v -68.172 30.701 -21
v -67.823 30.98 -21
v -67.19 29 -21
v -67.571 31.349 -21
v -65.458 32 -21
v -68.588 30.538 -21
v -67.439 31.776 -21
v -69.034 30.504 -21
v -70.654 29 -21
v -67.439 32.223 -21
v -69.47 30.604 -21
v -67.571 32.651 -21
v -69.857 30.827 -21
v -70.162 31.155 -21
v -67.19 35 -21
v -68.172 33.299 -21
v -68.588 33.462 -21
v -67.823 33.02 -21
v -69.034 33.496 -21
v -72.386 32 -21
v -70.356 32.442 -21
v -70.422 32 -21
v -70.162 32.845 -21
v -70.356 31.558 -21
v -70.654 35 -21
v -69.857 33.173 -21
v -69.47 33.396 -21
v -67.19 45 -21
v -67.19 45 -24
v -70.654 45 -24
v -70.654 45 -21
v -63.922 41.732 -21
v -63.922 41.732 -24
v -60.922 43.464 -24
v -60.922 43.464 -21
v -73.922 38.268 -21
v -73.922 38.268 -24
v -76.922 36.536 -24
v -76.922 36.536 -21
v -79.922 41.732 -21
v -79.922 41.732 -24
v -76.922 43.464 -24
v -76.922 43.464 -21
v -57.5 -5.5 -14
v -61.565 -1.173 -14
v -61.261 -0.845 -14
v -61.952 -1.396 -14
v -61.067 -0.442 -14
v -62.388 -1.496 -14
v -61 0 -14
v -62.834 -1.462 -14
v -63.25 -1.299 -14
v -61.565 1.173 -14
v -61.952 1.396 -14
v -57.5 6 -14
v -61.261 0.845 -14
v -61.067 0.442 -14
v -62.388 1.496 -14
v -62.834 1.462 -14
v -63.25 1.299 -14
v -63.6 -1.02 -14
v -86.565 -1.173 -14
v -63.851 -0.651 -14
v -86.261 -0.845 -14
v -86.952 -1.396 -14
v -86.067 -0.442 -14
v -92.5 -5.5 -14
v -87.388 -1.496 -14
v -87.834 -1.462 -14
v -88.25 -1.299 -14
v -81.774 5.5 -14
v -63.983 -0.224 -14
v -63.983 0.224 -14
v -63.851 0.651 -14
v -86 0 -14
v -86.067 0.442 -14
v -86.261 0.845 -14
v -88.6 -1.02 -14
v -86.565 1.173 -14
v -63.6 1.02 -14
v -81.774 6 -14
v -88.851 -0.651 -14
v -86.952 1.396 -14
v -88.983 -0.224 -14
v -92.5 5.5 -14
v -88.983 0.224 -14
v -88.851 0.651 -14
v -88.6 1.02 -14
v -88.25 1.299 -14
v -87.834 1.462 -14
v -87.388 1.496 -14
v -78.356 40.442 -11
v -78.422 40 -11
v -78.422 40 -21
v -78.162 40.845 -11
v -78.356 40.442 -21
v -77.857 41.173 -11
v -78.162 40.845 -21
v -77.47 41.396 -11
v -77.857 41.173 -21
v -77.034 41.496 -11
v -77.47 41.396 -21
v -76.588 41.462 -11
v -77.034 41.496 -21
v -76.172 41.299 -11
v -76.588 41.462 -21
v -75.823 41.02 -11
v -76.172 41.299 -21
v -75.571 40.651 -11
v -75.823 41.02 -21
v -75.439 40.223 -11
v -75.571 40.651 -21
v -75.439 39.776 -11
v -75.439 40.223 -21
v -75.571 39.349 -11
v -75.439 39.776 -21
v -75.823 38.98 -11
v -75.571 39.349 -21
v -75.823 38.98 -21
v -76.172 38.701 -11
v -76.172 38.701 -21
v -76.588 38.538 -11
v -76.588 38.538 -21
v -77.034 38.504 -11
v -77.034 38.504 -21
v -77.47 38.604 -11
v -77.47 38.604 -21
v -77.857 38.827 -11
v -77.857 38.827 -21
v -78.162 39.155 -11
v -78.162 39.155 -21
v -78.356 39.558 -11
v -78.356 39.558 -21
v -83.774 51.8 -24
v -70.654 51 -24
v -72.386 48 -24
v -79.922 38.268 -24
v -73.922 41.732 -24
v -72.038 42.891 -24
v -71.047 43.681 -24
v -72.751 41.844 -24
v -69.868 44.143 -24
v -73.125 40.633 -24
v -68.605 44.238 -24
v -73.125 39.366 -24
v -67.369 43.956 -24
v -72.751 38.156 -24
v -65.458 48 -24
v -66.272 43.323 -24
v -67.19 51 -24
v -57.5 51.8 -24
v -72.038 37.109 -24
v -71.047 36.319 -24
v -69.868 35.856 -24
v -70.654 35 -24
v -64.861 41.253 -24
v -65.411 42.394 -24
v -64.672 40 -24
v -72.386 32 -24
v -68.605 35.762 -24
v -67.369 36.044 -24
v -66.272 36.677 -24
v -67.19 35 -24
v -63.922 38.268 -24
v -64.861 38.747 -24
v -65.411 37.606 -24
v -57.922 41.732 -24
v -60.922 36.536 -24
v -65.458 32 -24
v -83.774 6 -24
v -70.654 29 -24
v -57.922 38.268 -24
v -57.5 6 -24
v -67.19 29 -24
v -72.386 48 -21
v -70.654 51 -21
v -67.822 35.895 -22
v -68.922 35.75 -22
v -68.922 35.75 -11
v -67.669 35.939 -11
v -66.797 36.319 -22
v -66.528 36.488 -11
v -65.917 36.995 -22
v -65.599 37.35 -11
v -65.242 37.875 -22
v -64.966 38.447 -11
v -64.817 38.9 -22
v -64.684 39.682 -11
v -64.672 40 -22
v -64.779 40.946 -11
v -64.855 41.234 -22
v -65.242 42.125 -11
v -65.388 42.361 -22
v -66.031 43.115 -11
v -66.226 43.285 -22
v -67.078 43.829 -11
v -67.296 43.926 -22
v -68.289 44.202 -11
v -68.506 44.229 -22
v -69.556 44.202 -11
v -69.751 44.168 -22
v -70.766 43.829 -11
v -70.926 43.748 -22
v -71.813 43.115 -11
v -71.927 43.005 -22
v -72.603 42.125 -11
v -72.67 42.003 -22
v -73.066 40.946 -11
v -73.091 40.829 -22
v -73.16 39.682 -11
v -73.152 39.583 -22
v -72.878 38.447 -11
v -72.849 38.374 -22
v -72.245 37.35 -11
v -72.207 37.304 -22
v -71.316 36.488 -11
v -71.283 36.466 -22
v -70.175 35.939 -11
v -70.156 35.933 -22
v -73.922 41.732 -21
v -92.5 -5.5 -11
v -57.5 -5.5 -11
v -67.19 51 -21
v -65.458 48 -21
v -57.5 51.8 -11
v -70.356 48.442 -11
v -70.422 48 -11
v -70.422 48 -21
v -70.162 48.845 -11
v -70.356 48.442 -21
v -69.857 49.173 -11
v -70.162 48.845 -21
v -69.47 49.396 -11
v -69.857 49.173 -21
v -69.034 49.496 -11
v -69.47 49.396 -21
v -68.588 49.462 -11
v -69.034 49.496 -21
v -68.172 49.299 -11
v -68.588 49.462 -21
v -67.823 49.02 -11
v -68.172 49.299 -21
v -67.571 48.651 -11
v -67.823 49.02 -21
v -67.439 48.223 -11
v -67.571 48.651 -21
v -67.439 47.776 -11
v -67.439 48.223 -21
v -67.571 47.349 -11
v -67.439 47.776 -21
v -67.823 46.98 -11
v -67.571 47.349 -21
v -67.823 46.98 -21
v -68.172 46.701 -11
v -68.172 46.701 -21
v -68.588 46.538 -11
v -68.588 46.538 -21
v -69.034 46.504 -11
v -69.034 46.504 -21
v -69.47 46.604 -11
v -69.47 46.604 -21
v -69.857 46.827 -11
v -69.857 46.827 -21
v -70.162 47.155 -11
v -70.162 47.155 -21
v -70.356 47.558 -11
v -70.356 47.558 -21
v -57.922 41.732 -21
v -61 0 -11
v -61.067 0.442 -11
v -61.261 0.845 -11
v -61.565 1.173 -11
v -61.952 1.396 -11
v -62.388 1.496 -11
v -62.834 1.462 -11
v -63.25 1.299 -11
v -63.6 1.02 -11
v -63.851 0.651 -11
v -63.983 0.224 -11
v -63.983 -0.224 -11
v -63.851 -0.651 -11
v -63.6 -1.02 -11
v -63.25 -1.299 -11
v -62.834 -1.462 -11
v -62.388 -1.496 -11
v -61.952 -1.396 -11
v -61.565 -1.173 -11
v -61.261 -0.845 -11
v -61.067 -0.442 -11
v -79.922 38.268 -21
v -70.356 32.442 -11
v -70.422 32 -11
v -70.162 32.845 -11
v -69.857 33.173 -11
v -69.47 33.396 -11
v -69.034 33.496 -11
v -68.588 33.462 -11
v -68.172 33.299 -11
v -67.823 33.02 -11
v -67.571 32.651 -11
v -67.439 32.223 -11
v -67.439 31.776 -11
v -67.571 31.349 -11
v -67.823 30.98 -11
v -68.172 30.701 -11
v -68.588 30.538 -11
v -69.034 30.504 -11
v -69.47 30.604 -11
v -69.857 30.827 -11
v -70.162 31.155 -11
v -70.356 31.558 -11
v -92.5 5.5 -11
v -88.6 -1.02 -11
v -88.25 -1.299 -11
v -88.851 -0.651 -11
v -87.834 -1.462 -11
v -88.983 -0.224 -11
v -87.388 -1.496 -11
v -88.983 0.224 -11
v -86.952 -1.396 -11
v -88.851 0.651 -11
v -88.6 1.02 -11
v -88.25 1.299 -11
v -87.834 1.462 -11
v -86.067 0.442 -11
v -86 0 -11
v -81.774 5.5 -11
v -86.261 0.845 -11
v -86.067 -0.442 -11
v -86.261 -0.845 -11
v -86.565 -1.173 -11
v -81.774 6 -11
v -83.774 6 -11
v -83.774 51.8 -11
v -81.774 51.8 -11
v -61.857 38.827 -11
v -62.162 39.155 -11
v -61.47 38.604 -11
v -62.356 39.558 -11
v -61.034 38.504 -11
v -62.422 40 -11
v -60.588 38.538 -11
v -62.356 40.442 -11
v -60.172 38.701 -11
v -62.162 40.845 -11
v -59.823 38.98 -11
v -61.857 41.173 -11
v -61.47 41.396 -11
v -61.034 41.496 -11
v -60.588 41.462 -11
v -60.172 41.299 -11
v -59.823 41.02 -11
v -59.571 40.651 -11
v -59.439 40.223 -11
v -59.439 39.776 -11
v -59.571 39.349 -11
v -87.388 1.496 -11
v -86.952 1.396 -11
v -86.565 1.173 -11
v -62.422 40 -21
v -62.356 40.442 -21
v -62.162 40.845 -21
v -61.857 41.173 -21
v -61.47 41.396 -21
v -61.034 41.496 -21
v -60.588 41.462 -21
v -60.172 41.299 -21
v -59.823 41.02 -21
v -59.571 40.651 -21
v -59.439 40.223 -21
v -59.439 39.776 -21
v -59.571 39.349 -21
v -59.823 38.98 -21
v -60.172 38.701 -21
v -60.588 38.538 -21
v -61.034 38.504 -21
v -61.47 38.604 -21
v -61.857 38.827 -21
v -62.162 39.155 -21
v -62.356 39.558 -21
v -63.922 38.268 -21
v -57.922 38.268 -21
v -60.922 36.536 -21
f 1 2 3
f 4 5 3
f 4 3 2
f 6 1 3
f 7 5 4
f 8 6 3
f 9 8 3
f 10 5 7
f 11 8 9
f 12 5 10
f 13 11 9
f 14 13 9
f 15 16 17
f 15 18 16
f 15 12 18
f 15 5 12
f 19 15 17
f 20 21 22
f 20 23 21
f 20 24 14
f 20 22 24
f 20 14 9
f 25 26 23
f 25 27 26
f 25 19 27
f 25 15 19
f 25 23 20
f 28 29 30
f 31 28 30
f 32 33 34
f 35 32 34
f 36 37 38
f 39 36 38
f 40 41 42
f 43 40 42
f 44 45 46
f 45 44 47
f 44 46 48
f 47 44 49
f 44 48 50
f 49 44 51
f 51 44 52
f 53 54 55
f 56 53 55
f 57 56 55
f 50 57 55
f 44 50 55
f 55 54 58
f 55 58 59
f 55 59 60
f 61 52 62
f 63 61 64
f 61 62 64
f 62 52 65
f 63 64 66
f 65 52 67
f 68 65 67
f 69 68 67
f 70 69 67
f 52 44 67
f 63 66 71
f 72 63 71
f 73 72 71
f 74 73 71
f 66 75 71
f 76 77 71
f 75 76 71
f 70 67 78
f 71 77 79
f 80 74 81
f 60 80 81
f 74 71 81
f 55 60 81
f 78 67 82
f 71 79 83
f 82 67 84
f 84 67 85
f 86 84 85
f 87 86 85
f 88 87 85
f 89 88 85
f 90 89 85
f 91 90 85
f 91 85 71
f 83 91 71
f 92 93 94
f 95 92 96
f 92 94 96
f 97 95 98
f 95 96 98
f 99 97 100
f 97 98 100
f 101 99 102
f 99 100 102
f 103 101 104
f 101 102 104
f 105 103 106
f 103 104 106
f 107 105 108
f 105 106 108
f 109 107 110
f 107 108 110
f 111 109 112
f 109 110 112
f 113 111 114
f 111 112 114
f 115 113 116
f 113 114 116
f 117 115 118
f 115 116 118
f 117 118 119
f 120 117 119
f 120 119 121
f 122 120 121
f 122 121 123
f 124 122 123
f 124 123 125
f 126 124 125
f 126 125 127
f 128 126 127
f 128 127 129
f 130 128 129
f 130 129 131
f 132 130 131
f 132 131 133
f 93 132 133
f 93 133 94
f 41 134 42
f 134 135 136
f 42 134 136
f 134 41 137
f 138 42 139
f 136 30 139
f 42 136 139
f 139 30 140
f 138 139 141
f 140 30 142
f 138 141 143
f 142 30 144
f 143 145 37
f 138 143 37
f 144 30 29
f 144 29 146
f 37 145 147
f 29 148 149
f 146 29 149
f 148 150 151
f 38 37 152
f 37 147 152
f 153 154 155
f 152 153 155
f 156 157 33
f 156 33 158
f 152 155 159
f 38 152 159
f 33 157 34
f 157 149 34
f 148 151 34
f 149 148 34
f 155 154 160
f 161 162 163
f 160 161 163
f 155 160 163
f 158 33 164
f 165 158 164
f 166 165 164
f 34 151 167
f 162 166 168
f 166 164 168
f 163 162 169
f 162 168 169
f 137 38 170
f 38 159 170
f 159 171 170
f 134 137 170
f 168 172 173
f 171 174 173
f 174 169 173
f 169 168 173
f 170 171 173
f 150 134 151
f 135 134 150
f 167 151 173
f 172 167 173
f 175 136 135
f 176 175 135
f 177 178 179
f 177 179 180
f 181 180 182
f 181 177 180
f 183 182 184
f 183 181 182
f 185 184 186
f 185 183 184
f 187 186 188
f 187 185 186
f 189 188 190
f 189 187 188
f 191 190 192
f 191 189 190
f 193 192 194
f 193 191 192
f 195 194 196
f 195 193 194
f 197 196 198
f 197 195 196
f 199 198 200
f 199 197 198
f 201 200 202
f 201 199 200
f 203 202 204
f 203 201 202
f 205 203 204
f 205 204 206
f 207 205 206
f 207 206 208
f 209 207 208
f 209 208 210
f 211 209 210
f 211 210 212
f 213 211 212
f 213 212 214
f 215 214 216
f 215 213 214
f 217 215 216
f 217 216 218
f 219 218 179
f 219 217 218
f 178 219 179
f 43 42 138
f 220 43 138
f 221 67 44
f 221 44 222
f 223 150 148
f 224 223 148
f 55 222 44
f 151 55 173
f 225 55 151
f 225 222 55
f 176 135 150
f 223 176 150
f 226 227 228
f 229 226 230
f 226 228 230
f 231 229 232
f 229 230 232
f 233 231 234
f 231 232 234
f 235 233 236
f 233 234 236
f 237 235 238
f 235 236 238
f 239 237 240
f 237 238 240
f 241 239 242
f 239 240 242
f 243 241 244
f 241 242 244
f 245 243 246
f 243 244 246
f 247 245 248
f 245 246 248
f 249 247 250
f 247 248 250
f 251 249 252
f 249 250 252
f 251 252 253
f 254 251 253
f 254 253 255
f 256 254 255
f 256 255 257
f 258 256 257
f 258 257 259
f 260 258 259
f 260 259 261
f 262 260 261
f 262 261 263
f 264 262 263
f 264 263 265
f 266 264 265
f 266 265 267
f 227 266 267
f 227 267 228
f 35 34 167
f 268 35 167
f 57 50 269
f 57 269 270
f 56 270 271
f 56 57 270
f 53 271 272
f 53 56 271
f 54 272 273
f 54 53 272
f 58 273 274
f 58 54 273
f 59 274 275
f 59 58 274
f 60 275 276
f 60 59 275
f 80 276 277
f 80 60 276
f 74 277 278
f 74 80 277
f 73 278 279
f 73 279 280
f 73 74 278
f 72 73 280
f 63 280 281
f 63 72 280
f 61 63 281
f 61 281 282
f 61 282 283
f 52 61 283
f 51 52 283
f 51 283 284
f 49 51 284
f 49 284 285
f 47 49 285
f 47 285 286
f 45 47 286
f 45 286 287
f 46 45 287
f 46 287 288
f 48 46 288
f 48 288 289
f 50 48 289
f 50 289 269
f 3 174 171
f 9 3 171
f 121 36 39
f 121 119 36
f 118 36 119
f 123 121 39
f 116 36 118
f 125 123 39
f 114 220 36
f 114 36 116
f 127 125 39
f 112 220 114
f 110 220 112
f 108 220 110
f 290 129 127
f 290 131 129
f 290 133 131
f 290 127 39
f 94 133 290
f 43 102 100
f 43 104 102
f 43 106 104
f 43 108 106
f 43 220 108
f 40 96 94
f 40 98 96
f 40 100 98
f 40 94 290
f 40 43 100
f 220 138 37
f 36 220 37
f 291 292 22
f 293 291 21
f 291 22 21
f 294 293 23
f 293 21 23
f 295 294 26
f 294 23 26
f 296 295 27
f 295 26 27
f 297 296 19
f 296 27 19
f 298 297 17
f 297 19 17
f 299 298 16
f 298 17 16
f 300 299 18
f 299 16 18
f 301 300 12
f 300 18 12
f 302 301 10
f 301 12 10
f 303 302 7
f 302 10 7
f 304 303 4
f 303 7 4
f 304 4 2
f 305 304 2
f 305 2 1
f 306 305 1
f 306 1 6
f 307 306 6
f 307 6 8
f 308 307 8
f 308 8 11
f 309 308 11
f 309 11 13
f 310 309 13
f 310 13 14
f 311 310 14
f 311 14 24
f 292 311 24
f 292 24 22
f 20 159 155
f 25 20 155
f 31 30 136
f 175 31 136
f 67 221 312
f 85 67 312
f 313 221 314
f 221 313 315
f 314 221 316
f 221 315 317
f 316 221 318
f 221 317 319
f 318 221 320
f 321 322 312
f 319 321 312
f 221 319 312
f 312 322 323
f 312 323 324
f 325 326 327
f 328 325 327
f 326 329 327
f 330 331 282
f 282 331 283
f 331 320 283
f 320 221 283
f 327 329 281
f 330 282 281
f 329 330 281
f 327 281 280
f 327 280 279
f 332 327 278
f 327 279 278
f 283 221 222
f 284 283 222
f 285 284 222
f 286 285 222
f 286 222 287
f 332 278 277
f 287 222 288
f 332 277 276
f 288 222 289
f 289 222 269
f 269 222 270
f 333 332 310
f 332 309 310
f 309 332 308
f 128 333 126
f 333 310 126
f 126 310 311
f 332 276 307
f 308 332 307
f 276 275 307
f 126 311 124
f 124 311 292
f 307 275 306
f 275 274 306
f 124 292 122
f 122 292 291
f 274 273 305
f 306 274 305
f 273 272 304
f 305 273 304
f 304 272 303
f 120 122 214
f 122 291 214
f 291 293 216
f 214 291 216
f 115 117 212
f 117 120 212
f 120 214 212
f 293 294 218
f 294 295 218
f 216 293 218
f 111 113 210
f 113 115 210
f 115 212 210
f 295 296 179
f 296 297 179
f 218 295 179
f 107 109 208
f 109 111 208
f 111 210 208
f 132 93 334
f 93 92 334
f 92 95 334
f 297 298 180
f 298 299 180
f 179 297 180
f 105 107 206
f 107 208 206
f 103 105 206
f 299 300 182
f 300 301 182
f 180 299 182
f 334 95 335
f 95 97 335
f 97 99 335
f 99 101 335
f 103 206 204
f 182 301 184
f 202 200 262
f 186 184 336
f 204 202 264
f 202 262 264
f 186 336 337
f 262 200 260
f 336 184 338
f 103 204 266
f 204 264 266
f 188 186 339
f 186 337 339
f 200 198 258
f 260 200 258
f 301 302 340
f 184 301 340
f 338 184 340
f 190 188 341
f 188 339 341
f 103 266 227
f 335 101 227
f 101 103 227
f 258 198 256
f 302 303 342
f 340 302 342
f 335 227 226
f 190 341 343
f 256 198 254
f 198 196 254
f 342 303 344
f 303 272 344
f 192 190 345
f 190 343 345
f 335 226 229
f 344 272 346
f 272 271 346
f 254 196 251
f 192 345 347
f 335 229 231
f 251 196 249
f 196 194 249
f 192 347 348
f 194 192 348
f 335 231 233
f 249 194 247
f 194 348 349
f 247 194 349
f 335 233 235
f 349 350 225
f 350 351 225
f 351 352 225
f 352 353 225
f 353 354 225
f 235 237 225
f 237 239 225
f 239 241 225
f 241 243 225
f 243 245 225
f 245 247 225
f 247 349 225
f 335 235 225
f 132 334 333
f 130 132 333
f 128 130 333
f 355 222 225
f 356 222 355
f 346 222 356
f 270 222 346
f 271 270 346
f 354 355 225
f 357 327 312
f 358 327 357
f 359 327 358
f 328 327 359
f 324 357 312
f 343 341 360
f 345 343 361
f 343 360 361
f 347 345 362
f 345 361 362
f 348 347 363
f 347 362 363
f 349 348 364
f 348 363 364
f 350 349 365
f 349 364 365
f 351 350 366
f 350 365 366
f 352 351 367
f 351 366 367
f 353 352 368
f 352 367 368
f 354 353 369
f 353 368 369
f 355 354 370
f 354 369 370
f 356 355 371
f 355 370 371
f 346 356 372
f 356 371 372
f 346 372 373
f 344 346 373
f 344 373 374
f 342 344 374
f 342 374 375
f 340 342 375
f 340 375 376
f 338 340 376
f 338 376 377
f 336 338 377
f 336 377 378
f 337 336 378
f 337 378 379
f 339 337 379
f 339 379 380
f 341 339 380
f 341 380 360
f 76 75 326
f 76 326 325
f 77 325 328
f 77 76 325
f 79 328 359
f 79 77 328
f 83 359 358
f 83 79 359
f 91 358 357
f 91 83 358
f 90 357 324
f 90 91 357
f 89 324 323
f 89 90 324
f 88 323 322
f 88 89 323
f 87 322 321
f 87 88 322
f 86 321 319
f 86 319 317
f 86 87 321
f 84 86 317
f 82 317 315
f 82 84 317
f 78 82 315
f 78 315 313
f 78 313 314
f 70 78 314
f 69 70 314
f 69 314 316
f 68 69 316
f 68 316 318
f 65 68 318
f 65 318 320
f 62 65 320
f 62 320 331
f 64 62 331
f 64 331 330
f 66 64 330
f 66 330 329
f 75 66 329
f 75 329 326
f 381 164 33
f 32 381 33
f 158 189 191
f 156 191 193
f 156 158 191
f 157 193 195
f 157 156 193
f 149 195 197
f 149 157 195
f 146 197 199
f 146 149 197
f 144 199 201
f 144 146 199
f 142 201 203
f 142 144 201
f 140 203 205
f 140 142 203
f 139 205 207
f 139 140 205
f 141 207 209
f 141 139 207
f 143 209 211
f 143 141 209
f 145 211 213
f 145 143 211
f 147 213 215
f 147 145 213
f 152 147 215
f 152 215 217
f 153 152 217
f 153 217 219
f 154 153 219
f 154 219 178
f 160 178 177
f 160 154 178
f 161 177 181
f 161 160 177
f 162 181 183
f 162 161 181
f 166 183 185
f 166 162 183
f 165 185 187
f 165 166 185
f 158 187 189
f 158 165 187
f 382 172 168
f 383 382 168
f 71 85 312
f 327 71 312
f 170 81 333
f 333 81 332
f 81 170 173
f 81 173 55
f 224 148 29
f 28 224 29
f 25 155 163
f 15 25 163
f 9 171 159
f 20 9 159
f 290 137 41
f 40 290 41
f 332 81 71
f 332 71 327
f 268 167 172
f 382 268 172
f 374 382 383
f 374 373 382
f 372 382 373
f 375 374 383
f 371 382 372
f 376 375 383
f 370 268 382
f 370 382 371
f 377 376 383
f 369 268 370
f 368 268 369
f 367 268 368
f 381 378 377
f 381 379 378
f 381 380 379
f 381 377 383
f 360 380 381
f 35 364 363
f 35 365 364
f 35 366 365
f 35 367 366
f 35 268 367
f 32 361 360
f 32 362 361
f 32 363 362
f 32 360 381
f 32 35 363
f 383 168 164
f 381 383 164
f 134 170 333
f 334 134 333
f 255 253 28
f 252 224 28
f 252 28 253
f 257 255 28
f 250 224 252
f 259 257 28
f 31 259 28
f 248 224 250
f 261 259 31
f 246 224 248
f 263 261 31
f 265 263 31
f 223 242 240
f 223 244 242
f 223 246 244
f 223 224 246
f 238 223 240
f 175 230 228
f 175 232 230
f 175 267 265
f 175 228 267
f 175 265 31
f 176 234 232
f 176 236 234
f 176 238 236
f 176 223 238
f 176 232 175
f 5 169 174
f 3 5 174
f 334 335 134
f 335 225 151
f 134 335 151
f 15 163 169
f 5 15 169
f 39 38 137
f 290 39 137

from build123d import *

# Parameters (mm, degrees)
SKETCH1_W                   = 24.274152735811775
SKETCH1_H                   = 45.79992080637105
SKETCH1_R                   = 4.250000000000006
BOSS_EXTRUDE1_DEPTH         = 2
SKETCH1_3_W                 = 24.274152735811775
SKETCH1_3_H                 = 2
SKETCH1_3_H_2               = 43.79992080637105
BOSS_EXTRUDE2_DEPTH         = 8
BOSS_EXTRUDE3_START         = -8
SKETCH1_4_W                 = 24.274152735811775
SKETCH1_4_H                 = 43.79992080637105
SKETCH1_4_H_2               = 2
SKETCH1_4_R                 = 1.500000000000004
SKETCH1_4_R_2               = 1.4999999999999971
BOSS_EXTRUDE3_DEPTH         = 3
BODY_MOVE_COPY1_START       = -81.774152736
BODY_MOVE_COPY1_OUTLINE_W   = 13.599999999999994
BODY_MOVE_COPY1_OUTLINE_H   = 22
BODY_MOVE_COPY1_DEPTH       = 24.274152736
BODY_MOVE_COPY1_2_OUTLINE_W = 13.599999999999994
BODY_MOVE_COPY1_2_OUTLINE_H = 22
BODY_MOVE_COPY1_2_DEPTH     = 8.925981831
BODY_MOVE_COPY1_START_2     = -64.996207244
BODY_MOVE_COPY1_3_OUTLINE_W = 13.599999999999994
BODY_MOVE_COPY1_3_OUTLINE_H = 22
BODY_MOVE_COPY1_3_DEPTH     = 7.496207244
BODY_MOVE_COPY1_START_3     = -92.5
BODY_MOVE_COPY1_4_OUTLINE_W = 11
BODY_MOVE_COPY1_4_OUTLINE_H = 6.000000000000002
BODY_MOVE_COPY1_4_DEPTH     = 10.725847264
BODY_MOVE_COPY1_START_4     = -11
BODY_MOVE_COPY1_5_DEPTH     = 13
BODY_MOVE_COPY1_START_5     = -22
BODY_MOVE_COPY1_6_OUTLINE_R = 1.5
BODY_MOVE_COPY1_6_DEPTH     = 11
BODY_MOVE_COPY1_START_6     = -24
BODY_MOVE_COPY1_7_OUTLINE_R = 4.25
BODY_MOVE_COPY1_7_DEPTH     = 2
SKETCH2_R                   = 2.4999999999999956
SKETCH2_R_2                 = 1.7499999999999991
BOSS_EXTRUDE4_DEPTH         = 2
SKETCH2_R_3                 = 2.499999999999995
SKETCH2_R_4                 = 1.7500000000000013
BOSS_EXTRUDE4_2_DEPTH       = 2
BOSS_EXTRUDE5_START         = 2
SKETCH2_3_R                 = 2.499999999999995
SKETCH2_3_R_2               = 2.4999999999999956
BOSS_EXTRUDE5_DEPTH         = 10
BOSS_EXTRUDE8_START         = 2
BOSS_EXTRUDE8_OUTLINE_R     = 2.5
BOSS_EXTRUDE8_OUTLINE_R_2   = 1.75
BOSS_EXTRUDE8_DEPTH         = 10
BOSS_EXTRUDE8_2_OUTLINE_R   = 2.5
BOSS_EXTRUDE8_2_OUTLINE_R_2 = 1.5
BOSS_EXTRUDE8_2_DEPTH       = 12
BOSS_EXTRUDE9_START         = -22
SKETCH1_5_R                 = 4.250000000000006
BOSS_EXTRUDE9_DEPTH         = 11
SKETCH3_R                   = 4.250000000000006
SKETCH3_R_2                 = 1.4999999999999973
SKETCH3_R_3                 = 1.4999999999999822
CUT_EXTRUDE1_DEPTH          = 3
SKETCH3_2_R                 = 1.4999999999999822
SKETCH3_2_R_2               = 1.4999999999999973
CUT_EXTRUDE2_DEPTH          = 112.56199728722034
CUT_EXTRUDE3_DEPTH          = 69.81517846049216
BOSS_EXTRUDE10_DEPTH        = 2


with BuildPart() as part:
    # Sketch1 → Boss-Extrude1 (new body)
    with BuildSketch(Plane.XY):
        with Locations((-69.63707636790589, 28.899960403185524)):
            Rectangle(SKETCH1_W, SKETCH1_H)
        with Locations((-68.92218907483289, 39.99992080637105)):
            Circle(SKETCH1_R, mode=Mode.SUBTRACT)
    extrude(amount=BOSS_EXTRUDE1_DEPTH)

    # Sketch1<3> → Boss-Extrude2 (add)
    # profile 1 of 2: a face of its own
    with BuildSketch(Plane.XY):
        with Locations((-69.63707636790589, 7)):
            Rectangle(SKETCH1_3_W, SKETCH1_3_H)
    # profile 2 of 2: a face of its own
    with BuildSketch(Plane.XY):
        with Locations((-69.63707636790589, 29.899960403185524)):
            Rectangle(SKETCH1_3_W, SKETCH1_3_H_2)
        Polygon((-61.07022541385397, 39.99992080637103), (-64.99620724434341, 33.19992080637105), (-72.84817090532232, 33.19992080637105), (-76.77415273581178, 39.999920806371065), (-72.84817090532235, 46.79992080637104), (-64.99620724434344, 46.79992080637104), align=None, mode=Mode.SUBTRACT)
    extrude(amount=-BOSS_EXTRUDE2_DEPTH)

    # Sketch1<4> → Boss-Extrude3 (add)
    # profile 1 of 7: a face of its own
    with BuildSketch(Plane.XY.offset(BOSS_EXTRUDE3_START)):
        with Locations((-69.63707636790589, 29.899960403185524)):
            Rectangle(SKETCH1_4_W, SKETCH1_4_H)
        Polygon((-61.07022541385397, 39.99992080637103), (-64.99620724434341, 33.19992080637105), (-72.84817090532232, 33.19992080637105), (-76.77415273581178, 39.999920806371065), (-72.84817090532235, 46.79992080637104), (-64.99620724434344, 46.79992080637104), align=None, mode=Mode.SUBTRACT)
    # profile 2 of 7: a face of its own
    with BuildSketch(Plane.XY.offset(BOSS_EXTRUDE3_START)):
        Polygon((-67.5, -5.500000000000001), (-67.5, 5.5), (-57.5, 5.5), (-57.49999999999999, -5.5), align=None)
        Polygon((-59.03589838486225, -2.082e-14), (-60.76794919243112, 2.999999999999975), (-64.23205080756887, 2.999999999999975), (-65.96410161513775, -2.776e-14), (-64.23205080756888, -3.0000000000000098), (-60.767949192431125, -3.0000000000000098), align=None, mode=Mode.SUBTRACT)
    # profile 3 of 7: a face of its own
    with BuildSketch(Plane.XY.offset(BOSS_EXTRUDE3_START)):
        Polygon((-67.5, 5.5), (-57.5, 5.5), (-57.5, 6), (-81.77415273581178, 6), (-81.77415273581178, 5.5), align=None)
    # profile 4 of 7: a face of its own
    with BuildSketch(Plane.XY.offset(BOSS_EXTRUDE3_START)):
        with Locations((-69.63707636790589, 7)):
            Rectangle(SKETCH1_4_W, SKETCH1_4_H_2)
    # profile 5 of 7: a face of its own
    with BuildSketch(Plane.XY.offset(BOSS_EXTRUDE3_START)):
        Polygon((-81.77415273581178, -5.500000000000003), (-67.5, -5.500000000000001), (-67.5, 5.499999999999999), (-81.77415273581178, 5.499999999999997), align=None)
    # profile 6 of 7: a face of its own
    with BuildSketch(Plane.XY.offset(BOSS_EXTRUDE3_START)):
        Polygon((-60.767949192431125, -3.0000000000000098), (-59.03589838486225, -2.082e-14), (-60.76794919243112, 2.999999999999975), (-64.23205080756887, 2.999999999999975), (-65.96410161513775, -2.776e-14), (-64.23205080756888, -3.0000000000000098), align=None)
        with Locations(Location((-62.5, 0, 0), (0, 0, 270))):
            Circle(SKETCH1_4_R, mode=Mode.SUBTRACT)
    # profile 7 of 7: a face of its own
    with BuildSketch(Plane.XY.offset(BOSS_EXTRUDE3_START)):
        Polygon((-92.5, -5.500000000000004), (-92.5, 5.499999999999996), (-81.77415273581178, 5.499999999999997), (-81.77415273581178, -5.500000000000003), align=None)
        with Locations(Location((-87.5, -2.42e-15, 0), (0, 0, 270))):
            Circle(SKETCH1_4_R_2, mode=Mode.SUBTRACT)
    extrude(amount=-BOSS_EXTRUDE3_DEPTH)

    # Body-Move/Copy1: read off the stored shape, not the designer's step
    # Body-Move/Copy1 outline → Body-Move/Copy1 (add)
    with BuildSketch(Plane.YZ.offset(BODY_MOVE_COPY1_START)):
        Polygon((6, -24), (51.799920806, -24), (51.799920806, 2), (6, 2), (6, -8), (-5.5, -8), (-5.5, -14), (6, -14), align=None)
        with Locations((39.999920806, -11)):
            Rectangle(BODY_MOVE_COPY1_OUTLINE_W, BODY_MOVE_COPY1_OUTLINE_H, mode=Mode.SUBTRACT)
    extrude(amount=BODY_MOVE_COPY1_DEPTH)

    # Body-Move_Copy1 2 outline → Body-Move_Copy1 2 (add)
    with BuildSketch(Plane.YZ.offset(BODY_MOVE_COPY1_START)):
        with Locations((39.999920806, -11)):
            Rectangle(BODY_MOVE_COPY1_2_OUTLINE_W, BODY_MOVE_COPY1_2_OUTLINE_H)
    extrude(amount=BODY_MOVE_COPY1_2_DEPTH)

    # Body-Move_Copy1 3 outline → Body-Move_Copy1 3 (add)
    with BuildSketch(Plane.YZ.offset(BODY_MOVE_COPY1_START_2)):
        with Locations((39.999920806, -11)):
            Rectangle(BODY_MOVE_COPY1_3_OUTLINE_W, BODY_MOVE_COPY1_3_OUTLINE_H)
    extrude(amount=BODY_MOVE_COPY1_3_DEPTH)

    # Body-Move_Copy1 4 outline → Body-Move_Copy1 4 (add)
    with BuildSketch(Plane.YZ.offset(BODY_MOVE_COPY1_START_3)):
        with Locations((0, -11)):
            Rectangle(BODY_MOVE_COPY1_4_OUTLINE_W, BODY_MOVE_COPY1_4_OUTLINE_H)
    extrude(amount=BODY_MOVE_COPY1_4_DEPTH)

    # Body-Move_Copy1 5 outline → Body-Move_Copy1 5 (cut)
    with BuildSketch(Plane.XY.offset(BODY_MOVE_COPY1_START_4)):
        Polygon((-81.774152736, 51.799920806), (-81.774152736, 5.5), (-92.5, 5.5), (-92.5, -5.5), (-57.5, -5.5), (-57.5, 51.799920806), align=None)
    extrude(amount=BODY_MOVE_COPY1_5_DEPTH, mode=Mode.SUBTRACT)

    # Body-Move_Copy1 6 outline → Body-Move_Copy1 6 (cut)
    with BuildSketch(Plane.XY.offset(BODY_MOVE_COPY1_START_5)):
        Polygon((-64.996207244, 33.199920806), (-61.070225414, 39.999920806), (-64.996207244, 46.799920806), align=None)
        Polygon((-72.848170905, 46.799920806), (-76.774152736, 39.999920806), (-72.848170905, 33.199920806), align=None)
        with Locations((-87.5, 0)):
            Circle(BODY_MOVE_COPY1_6_OUTLINE_R)
        with Locations((-62.5, 0)):
            Circle(BODY_MOVE_COPY1_6_OUTLINE_R)
    extrude(amount=BODY_MOVE_COPY1_6_DEPTH, mode=Mode.SUBTRACT)

    # Body-Move_Copy1 7 outline → Body-Move_Copy1 7 (cut)
    with BuildSketch(Plane.XY.offset(BODY_MOVE_COPY1_START_6)):
        with Locations((-68.922189075, 39.999920806)):
            Circle(BODY_MOVE_COPY1_7_OUTLINE_R)
    extrude(amount=BODY_MOVE_COPY1_7_DEPTH, mode=Mode.SUBTRACT)

    # Sketch2<3> → Boss-Extrude5 (add)
    with BuildSketch(Plane(origin=(-1.1724e-13, 16.499999999999897, 6.01e-15), x_dir=(1, 7.11e-15, 0), z_dir=(-7.11e-15, 1, 3.6e-16)).offset(BOSS_EXTRUDE5_START)):
        Polygon((-97.77415273581177, 38.249999999999936), (-97.77415273581177, 10.999999999999943), (-81.77415273581173, 10.999999999999943), (-81.77415273581171, 38.249999999999936), align=None)
        with Locations(Location((-95.02415273581177, 14.249999999999943, 0), (0, 0, 180))):
            Circle(SKETCH2_3_R, mode=Mode.SUBTRACT)
        with Locations(Location((-95.02415273581174, 33.249999999999936, 0), (0, 0, 180))):
            Circle(SKETCH2_3_R_2, mode=Mode.SUBTRACT)
    extrude(amount=BOSS_EXTRUDE5_DEPTH)

    # Sketch1<5> → Boss-Extrude9 (add)
    with BuildSketch(Plane.XY.offset(BOSS_EXTRUDE9_START)):
        Polygon((-76.77415273581178, 39.999920806371065), (-72.84817090532232, 33.19992080637105), (-64.99620724434341, 33.19992080637105), (-61.07022541385397, 39.99992080637103), (-64.99620724434344, 46.79992080637104), (-72.84817090532235, 46.79992080637104), align=None)
        with Locations(Location((-68.92218907483289, 39.99992080637105, 0), (0, 0, 270))):
            Circle(SKETCH1_5_R, mode=Mode.SUBTRACT)
    extrude(amount=BOSS_EXTRUDE9_DEPTH)

    # Sketch3 → Cut-Extrude1 (cut)
    # profile 1 of 5: a face of its own
    with BuildSketch(Plane(origin=(0, 0, -23.99999999999991), x_dir=(-1, 0, 0), z_dir=(0, 0, -1))):
        with Locations(Location((68.92218907483289, 39.99992080637105, 0), (0, 0, 270))):
            Circle(SKETCH3_R)
    # profile 2 of 5: a face of its own
    with BuildSketch(Plane(origin=(0, 0, -23.99999999999991), x_dir=(-1, 0, 0), z_dir=(0, 0, -1))):
        Polygon((67.190138267264, 50.999920806371065), (65.45808745969511, 47.999920806371065), (67.190138267264, 44.999920806371065), (70.65423988240175, 44.999920806371065), (72.38629068997062, 47.999920806371065), (70.65423988240177, 50.999920806371065), align=None)
        with Locations(Location((68.92218907483289, 47.99992080637105, 0), (0, 0, 90))):
            Circle(SKETCH3_R_2, mode=Mode.SUBTRACT)
    # profile 3 of 5: a face of its own
    with BuildSketch(Plane(origin=(0, 0, -23.99999999999991), x_dir=(-1, 0, 0), z_dir=(0, 0, -1))):
        Polygon((57.92218907483287, 38.26786999880217), (60.92218907483287, 36.535819191233294), (63.922189074832865, 38.267869998802176), (63.922189074832865, 41.73197161393993), (60.922189074832865, 43.464022421508815), (57.92218907483287, 41.73197161393994), align=None)
        with Locations(Location((60.922189074832886, 39.99992080637105, 0), (0, 0, 90))):
            Circle(SKETCH3_R_3, mode=Mode.SUBTRACT)
    # profile 4 of 5: a face of its own
    with BuildSketch(Plane(origin=(0, 0, -23.99999999999991), x_dir=(-1, 0, 0), z_dir=(0, 0, -1))):
        Polygon((79.92218907483291, 41.73197161393995), (76.92218907483289, 43.46402242150882), (73.92218907483291, 41.73197161393994), (73.92218907483291, 38.26786999880218), (76.92218907483291, 36.5358191912333), (79.92218907483291, 38.26786999880217), align=None)
        with Locations(Location((76.92218907483289, 39.999920806371065, 0), (0, 0, 90))):
            Circle(SKETCH3_R_3, mode=Mode.SUBTRACT)
    # profile 5 of 5: a face of its own
    with BuildSketch(Plane(origin=(0, 0, -23.99999999999991), x_dir=(-1, 0, 0), z_dir=(0, 0, -1))):
        Polygon((70.65423988240177, 28.999920806371044), (72.38629068997065, 31.999920806371048), (70.65423988240177, 34.999920806371044), (67.19013826726402, 34.999920806371044), (65.45808745969514, 31.999920806371026), (67.190138267264, 28.999920806371044), align=None)
        with Locations(Location((68.9221890748329, 31.999920806371062, 0), (0, 0, 90))):
            Circle(SKETCH3_R_3, mode=Mode.SUBTRACT)
    extrude(amount=-CUT_EXTRUDE1_DEPTH, mode=Mode.SUBTRACT)

    # Sketch3<2> → Cut-Extrude2 (cut, through all)
    with BuildSketch(Plane(origin=(0, 0, -23.99999999999991), x_dir=(-1, 0, 0), z_dir=(0, 0, -1))):
        with Locations((76.92218907483289, 39.999920806371065)):
            Circle(SKETCH3_2_R)
        with Locations((68.92218907483289, 47.99992080637105)):
            Circle(SKETCH3_2_R_2)
        with Locations((60.922189074832886, 39.99992080637105)):
            Circle(SKETCH3_2_R)
        with Locations((68.9221890748329, 31.999920806371062)):
            Circle(SKETCH3_2_R)
    extrude(amount=-CUT_EXTRUDE2_DEPTH, mode=Mode.SUBTRACT)


with BuildPart() as body_2:
    # Sketch2 → Boss-Extrude4 (new body)
    with BuildSketch(Plane(origin=(-1.1724e-13, 16.499999999999897, 6.01e-15), x_dir=(1, 7.11e-15, 0), z_dir=(-7.11e-15, 1, 3.6e-16))):
        with Locations(Location((-95.02415273581174, 33.249999999999936, 0), (0, 0, 180))):
            Circle(SKETCH2_R)
        with Locations(Location((-95.02415273581202, 33.24999999999956, 0), (0, 0, 180))):
            Circle(SKETCH2_R_2, mode=Mode.SUBTRACT)
    extrude(amount=BOSS_EXTRUDE4_DEPTH)

    # Boss-Extrude8 2 outline → Boss-Extrude8 2 (add)
    with BuildSketch(Plane(origin=(-1.1724e-13, 16.499999999999897, 6.01e-15), x_dir=(1, 7.11e-15, 0), z_dir=(-7.11e-15, 1, 3.6e-16))):
        with Locations((-95.024152736, 33.25)):
            Circle(BOSS_EXTRUDE8_2_OUTLINE_R)
        with Locations((-95.024152736, 33.25)):
            Circle(BOSS_EXTRUDE8_2_OUTLINE_R_2, mode=Mode.SUBTRACT)
    extrude(amount=BOSS_EXTRUDE8_2_DEPTH)


with BuildPart() as body_3:
    # Sketch2 → Boss-Extrude4 2 (new body)
    with BuildSketch(Plane(origin=(-1.1724e-13, 16.499999999999897, 6.01e-15), x_dir=(1, 7.11e-15, 0), z_dir=(-7.11e-15, 1, 3.6e-16))):
        with Locations(Location((-95.02415273581177, 14.249999999999943, 0), (0, 0, 180))):
            Circle(SKETCH2_R_3)
        with Locations(Location((-95.02415273581205, 14.24999999999956, 0), (0, 0, 180))):
            Circle(SKETCH2_R_4, mode=Mode.SUBTRACT)
    extrude(amount=BOSS_EXTRUDE4_2_DEPTH)

    # Boss-Extrude8: read off the stored shape, not the designer's step
    # Boss-Extrude8 outline → Boss-Extrude8 (add)
    with BuildSketch(Plane(origin=(-1.1724e-13, 16.499999999999897, 6.01e-15), x_dir=(1, 7.11e-15, 0), z_dir=(-7.11e-15, 1, 3.6e-16)).offset(BOSS_EXTRUDE8_START)):
        with Locations((-95.024152736, 14.25)):
            Circle(BOSS_EXTRUDE8_OUTLINE_R)
        with Locations((-95.024152736, 14.25)):
            Circle(BOSS_EXTRUDE8_OUTLINE_R_2, mode=Mode.SUBTRACT)
    extrude(amount=BOSS_EXTRUDE8_DEPTH)


with BuildPart() as cut_extrude3_tool:
    # Sketch4 → Cut-Extrude3 (new, through all)
    with BuildSketch(Plane.ZY.offset(81.77415273581178)):
        Polygon((-55.24015463130638, 6), (-23.99999999999991, 6), (-23.99999999999991, 18.499999999999318), (-23.99999999999991, 51.79992080637104), (-23.99999999999991, 75.17738748504144), (-55.24015463130638, 75.17738748504144), align=None)
        Polygon((-23.99999999999991, 18.499999999999318), (-23.99999999999991, 6), (-13.999999999999954, 6), (-10.999999999999954, 6), (-10.999999999999954, 18.499999999999314), align=None)
        Polygon((-23.99999999999991, 51.79992080637104), (-23.99999999999991, 18.499999999999318), (-10.999999999999954, 18.499999999999314), (-10.999999999999954, 51.79992080637105), align=None)
    extrude(amount=CUT_EXTRUDE3_DEPTH)


with BuildPart() as part_1:
    add(part.part)

    # Cut-Extrude3: cut by cut_extrude3_tool
    add(cut_extrude3_tool.part, mode=Mode.SUBTRACT)

    # Sketch4<3> → Boss-Extrude10 (add)
    with BuildSketch(Plane.ZY.offset(81.77415273581178)):
        Polygon((-23.99999999999991, 51.79992080637104), (-23.99999999999991, 18.499999999999318), (-10.999999999999954, 18.499999999999314), (-10.999999999999954, 51.79992080637105), align=None)
        Polygon((-23.99999999999991, 18.499999999999318), (-23.99999999999991, 6), (-13.999999999999954, 6), (-10.999999999999954, 6), (-10.999999999999954, 18.499999999999314), align=None)
    extrude(amount=BOSS_EXTRUDE10_DEPTH)


with BuildPart() as body_2_1:
    add(body_2.part)

    # Cut-Extrude3: cut by cut_extrude3_tool
    add(cut_extrude3_tool.part, mode=Mode.SUBTRACT)


with BuildPart() as body_3_1:
    add(body_3.part)

    # Cut-Extrude3: cut by cut_extrude3_tool
    add(cut_extrude3_tool.part, mode=Mode.SUBTRACT)


solid = part_1.part
